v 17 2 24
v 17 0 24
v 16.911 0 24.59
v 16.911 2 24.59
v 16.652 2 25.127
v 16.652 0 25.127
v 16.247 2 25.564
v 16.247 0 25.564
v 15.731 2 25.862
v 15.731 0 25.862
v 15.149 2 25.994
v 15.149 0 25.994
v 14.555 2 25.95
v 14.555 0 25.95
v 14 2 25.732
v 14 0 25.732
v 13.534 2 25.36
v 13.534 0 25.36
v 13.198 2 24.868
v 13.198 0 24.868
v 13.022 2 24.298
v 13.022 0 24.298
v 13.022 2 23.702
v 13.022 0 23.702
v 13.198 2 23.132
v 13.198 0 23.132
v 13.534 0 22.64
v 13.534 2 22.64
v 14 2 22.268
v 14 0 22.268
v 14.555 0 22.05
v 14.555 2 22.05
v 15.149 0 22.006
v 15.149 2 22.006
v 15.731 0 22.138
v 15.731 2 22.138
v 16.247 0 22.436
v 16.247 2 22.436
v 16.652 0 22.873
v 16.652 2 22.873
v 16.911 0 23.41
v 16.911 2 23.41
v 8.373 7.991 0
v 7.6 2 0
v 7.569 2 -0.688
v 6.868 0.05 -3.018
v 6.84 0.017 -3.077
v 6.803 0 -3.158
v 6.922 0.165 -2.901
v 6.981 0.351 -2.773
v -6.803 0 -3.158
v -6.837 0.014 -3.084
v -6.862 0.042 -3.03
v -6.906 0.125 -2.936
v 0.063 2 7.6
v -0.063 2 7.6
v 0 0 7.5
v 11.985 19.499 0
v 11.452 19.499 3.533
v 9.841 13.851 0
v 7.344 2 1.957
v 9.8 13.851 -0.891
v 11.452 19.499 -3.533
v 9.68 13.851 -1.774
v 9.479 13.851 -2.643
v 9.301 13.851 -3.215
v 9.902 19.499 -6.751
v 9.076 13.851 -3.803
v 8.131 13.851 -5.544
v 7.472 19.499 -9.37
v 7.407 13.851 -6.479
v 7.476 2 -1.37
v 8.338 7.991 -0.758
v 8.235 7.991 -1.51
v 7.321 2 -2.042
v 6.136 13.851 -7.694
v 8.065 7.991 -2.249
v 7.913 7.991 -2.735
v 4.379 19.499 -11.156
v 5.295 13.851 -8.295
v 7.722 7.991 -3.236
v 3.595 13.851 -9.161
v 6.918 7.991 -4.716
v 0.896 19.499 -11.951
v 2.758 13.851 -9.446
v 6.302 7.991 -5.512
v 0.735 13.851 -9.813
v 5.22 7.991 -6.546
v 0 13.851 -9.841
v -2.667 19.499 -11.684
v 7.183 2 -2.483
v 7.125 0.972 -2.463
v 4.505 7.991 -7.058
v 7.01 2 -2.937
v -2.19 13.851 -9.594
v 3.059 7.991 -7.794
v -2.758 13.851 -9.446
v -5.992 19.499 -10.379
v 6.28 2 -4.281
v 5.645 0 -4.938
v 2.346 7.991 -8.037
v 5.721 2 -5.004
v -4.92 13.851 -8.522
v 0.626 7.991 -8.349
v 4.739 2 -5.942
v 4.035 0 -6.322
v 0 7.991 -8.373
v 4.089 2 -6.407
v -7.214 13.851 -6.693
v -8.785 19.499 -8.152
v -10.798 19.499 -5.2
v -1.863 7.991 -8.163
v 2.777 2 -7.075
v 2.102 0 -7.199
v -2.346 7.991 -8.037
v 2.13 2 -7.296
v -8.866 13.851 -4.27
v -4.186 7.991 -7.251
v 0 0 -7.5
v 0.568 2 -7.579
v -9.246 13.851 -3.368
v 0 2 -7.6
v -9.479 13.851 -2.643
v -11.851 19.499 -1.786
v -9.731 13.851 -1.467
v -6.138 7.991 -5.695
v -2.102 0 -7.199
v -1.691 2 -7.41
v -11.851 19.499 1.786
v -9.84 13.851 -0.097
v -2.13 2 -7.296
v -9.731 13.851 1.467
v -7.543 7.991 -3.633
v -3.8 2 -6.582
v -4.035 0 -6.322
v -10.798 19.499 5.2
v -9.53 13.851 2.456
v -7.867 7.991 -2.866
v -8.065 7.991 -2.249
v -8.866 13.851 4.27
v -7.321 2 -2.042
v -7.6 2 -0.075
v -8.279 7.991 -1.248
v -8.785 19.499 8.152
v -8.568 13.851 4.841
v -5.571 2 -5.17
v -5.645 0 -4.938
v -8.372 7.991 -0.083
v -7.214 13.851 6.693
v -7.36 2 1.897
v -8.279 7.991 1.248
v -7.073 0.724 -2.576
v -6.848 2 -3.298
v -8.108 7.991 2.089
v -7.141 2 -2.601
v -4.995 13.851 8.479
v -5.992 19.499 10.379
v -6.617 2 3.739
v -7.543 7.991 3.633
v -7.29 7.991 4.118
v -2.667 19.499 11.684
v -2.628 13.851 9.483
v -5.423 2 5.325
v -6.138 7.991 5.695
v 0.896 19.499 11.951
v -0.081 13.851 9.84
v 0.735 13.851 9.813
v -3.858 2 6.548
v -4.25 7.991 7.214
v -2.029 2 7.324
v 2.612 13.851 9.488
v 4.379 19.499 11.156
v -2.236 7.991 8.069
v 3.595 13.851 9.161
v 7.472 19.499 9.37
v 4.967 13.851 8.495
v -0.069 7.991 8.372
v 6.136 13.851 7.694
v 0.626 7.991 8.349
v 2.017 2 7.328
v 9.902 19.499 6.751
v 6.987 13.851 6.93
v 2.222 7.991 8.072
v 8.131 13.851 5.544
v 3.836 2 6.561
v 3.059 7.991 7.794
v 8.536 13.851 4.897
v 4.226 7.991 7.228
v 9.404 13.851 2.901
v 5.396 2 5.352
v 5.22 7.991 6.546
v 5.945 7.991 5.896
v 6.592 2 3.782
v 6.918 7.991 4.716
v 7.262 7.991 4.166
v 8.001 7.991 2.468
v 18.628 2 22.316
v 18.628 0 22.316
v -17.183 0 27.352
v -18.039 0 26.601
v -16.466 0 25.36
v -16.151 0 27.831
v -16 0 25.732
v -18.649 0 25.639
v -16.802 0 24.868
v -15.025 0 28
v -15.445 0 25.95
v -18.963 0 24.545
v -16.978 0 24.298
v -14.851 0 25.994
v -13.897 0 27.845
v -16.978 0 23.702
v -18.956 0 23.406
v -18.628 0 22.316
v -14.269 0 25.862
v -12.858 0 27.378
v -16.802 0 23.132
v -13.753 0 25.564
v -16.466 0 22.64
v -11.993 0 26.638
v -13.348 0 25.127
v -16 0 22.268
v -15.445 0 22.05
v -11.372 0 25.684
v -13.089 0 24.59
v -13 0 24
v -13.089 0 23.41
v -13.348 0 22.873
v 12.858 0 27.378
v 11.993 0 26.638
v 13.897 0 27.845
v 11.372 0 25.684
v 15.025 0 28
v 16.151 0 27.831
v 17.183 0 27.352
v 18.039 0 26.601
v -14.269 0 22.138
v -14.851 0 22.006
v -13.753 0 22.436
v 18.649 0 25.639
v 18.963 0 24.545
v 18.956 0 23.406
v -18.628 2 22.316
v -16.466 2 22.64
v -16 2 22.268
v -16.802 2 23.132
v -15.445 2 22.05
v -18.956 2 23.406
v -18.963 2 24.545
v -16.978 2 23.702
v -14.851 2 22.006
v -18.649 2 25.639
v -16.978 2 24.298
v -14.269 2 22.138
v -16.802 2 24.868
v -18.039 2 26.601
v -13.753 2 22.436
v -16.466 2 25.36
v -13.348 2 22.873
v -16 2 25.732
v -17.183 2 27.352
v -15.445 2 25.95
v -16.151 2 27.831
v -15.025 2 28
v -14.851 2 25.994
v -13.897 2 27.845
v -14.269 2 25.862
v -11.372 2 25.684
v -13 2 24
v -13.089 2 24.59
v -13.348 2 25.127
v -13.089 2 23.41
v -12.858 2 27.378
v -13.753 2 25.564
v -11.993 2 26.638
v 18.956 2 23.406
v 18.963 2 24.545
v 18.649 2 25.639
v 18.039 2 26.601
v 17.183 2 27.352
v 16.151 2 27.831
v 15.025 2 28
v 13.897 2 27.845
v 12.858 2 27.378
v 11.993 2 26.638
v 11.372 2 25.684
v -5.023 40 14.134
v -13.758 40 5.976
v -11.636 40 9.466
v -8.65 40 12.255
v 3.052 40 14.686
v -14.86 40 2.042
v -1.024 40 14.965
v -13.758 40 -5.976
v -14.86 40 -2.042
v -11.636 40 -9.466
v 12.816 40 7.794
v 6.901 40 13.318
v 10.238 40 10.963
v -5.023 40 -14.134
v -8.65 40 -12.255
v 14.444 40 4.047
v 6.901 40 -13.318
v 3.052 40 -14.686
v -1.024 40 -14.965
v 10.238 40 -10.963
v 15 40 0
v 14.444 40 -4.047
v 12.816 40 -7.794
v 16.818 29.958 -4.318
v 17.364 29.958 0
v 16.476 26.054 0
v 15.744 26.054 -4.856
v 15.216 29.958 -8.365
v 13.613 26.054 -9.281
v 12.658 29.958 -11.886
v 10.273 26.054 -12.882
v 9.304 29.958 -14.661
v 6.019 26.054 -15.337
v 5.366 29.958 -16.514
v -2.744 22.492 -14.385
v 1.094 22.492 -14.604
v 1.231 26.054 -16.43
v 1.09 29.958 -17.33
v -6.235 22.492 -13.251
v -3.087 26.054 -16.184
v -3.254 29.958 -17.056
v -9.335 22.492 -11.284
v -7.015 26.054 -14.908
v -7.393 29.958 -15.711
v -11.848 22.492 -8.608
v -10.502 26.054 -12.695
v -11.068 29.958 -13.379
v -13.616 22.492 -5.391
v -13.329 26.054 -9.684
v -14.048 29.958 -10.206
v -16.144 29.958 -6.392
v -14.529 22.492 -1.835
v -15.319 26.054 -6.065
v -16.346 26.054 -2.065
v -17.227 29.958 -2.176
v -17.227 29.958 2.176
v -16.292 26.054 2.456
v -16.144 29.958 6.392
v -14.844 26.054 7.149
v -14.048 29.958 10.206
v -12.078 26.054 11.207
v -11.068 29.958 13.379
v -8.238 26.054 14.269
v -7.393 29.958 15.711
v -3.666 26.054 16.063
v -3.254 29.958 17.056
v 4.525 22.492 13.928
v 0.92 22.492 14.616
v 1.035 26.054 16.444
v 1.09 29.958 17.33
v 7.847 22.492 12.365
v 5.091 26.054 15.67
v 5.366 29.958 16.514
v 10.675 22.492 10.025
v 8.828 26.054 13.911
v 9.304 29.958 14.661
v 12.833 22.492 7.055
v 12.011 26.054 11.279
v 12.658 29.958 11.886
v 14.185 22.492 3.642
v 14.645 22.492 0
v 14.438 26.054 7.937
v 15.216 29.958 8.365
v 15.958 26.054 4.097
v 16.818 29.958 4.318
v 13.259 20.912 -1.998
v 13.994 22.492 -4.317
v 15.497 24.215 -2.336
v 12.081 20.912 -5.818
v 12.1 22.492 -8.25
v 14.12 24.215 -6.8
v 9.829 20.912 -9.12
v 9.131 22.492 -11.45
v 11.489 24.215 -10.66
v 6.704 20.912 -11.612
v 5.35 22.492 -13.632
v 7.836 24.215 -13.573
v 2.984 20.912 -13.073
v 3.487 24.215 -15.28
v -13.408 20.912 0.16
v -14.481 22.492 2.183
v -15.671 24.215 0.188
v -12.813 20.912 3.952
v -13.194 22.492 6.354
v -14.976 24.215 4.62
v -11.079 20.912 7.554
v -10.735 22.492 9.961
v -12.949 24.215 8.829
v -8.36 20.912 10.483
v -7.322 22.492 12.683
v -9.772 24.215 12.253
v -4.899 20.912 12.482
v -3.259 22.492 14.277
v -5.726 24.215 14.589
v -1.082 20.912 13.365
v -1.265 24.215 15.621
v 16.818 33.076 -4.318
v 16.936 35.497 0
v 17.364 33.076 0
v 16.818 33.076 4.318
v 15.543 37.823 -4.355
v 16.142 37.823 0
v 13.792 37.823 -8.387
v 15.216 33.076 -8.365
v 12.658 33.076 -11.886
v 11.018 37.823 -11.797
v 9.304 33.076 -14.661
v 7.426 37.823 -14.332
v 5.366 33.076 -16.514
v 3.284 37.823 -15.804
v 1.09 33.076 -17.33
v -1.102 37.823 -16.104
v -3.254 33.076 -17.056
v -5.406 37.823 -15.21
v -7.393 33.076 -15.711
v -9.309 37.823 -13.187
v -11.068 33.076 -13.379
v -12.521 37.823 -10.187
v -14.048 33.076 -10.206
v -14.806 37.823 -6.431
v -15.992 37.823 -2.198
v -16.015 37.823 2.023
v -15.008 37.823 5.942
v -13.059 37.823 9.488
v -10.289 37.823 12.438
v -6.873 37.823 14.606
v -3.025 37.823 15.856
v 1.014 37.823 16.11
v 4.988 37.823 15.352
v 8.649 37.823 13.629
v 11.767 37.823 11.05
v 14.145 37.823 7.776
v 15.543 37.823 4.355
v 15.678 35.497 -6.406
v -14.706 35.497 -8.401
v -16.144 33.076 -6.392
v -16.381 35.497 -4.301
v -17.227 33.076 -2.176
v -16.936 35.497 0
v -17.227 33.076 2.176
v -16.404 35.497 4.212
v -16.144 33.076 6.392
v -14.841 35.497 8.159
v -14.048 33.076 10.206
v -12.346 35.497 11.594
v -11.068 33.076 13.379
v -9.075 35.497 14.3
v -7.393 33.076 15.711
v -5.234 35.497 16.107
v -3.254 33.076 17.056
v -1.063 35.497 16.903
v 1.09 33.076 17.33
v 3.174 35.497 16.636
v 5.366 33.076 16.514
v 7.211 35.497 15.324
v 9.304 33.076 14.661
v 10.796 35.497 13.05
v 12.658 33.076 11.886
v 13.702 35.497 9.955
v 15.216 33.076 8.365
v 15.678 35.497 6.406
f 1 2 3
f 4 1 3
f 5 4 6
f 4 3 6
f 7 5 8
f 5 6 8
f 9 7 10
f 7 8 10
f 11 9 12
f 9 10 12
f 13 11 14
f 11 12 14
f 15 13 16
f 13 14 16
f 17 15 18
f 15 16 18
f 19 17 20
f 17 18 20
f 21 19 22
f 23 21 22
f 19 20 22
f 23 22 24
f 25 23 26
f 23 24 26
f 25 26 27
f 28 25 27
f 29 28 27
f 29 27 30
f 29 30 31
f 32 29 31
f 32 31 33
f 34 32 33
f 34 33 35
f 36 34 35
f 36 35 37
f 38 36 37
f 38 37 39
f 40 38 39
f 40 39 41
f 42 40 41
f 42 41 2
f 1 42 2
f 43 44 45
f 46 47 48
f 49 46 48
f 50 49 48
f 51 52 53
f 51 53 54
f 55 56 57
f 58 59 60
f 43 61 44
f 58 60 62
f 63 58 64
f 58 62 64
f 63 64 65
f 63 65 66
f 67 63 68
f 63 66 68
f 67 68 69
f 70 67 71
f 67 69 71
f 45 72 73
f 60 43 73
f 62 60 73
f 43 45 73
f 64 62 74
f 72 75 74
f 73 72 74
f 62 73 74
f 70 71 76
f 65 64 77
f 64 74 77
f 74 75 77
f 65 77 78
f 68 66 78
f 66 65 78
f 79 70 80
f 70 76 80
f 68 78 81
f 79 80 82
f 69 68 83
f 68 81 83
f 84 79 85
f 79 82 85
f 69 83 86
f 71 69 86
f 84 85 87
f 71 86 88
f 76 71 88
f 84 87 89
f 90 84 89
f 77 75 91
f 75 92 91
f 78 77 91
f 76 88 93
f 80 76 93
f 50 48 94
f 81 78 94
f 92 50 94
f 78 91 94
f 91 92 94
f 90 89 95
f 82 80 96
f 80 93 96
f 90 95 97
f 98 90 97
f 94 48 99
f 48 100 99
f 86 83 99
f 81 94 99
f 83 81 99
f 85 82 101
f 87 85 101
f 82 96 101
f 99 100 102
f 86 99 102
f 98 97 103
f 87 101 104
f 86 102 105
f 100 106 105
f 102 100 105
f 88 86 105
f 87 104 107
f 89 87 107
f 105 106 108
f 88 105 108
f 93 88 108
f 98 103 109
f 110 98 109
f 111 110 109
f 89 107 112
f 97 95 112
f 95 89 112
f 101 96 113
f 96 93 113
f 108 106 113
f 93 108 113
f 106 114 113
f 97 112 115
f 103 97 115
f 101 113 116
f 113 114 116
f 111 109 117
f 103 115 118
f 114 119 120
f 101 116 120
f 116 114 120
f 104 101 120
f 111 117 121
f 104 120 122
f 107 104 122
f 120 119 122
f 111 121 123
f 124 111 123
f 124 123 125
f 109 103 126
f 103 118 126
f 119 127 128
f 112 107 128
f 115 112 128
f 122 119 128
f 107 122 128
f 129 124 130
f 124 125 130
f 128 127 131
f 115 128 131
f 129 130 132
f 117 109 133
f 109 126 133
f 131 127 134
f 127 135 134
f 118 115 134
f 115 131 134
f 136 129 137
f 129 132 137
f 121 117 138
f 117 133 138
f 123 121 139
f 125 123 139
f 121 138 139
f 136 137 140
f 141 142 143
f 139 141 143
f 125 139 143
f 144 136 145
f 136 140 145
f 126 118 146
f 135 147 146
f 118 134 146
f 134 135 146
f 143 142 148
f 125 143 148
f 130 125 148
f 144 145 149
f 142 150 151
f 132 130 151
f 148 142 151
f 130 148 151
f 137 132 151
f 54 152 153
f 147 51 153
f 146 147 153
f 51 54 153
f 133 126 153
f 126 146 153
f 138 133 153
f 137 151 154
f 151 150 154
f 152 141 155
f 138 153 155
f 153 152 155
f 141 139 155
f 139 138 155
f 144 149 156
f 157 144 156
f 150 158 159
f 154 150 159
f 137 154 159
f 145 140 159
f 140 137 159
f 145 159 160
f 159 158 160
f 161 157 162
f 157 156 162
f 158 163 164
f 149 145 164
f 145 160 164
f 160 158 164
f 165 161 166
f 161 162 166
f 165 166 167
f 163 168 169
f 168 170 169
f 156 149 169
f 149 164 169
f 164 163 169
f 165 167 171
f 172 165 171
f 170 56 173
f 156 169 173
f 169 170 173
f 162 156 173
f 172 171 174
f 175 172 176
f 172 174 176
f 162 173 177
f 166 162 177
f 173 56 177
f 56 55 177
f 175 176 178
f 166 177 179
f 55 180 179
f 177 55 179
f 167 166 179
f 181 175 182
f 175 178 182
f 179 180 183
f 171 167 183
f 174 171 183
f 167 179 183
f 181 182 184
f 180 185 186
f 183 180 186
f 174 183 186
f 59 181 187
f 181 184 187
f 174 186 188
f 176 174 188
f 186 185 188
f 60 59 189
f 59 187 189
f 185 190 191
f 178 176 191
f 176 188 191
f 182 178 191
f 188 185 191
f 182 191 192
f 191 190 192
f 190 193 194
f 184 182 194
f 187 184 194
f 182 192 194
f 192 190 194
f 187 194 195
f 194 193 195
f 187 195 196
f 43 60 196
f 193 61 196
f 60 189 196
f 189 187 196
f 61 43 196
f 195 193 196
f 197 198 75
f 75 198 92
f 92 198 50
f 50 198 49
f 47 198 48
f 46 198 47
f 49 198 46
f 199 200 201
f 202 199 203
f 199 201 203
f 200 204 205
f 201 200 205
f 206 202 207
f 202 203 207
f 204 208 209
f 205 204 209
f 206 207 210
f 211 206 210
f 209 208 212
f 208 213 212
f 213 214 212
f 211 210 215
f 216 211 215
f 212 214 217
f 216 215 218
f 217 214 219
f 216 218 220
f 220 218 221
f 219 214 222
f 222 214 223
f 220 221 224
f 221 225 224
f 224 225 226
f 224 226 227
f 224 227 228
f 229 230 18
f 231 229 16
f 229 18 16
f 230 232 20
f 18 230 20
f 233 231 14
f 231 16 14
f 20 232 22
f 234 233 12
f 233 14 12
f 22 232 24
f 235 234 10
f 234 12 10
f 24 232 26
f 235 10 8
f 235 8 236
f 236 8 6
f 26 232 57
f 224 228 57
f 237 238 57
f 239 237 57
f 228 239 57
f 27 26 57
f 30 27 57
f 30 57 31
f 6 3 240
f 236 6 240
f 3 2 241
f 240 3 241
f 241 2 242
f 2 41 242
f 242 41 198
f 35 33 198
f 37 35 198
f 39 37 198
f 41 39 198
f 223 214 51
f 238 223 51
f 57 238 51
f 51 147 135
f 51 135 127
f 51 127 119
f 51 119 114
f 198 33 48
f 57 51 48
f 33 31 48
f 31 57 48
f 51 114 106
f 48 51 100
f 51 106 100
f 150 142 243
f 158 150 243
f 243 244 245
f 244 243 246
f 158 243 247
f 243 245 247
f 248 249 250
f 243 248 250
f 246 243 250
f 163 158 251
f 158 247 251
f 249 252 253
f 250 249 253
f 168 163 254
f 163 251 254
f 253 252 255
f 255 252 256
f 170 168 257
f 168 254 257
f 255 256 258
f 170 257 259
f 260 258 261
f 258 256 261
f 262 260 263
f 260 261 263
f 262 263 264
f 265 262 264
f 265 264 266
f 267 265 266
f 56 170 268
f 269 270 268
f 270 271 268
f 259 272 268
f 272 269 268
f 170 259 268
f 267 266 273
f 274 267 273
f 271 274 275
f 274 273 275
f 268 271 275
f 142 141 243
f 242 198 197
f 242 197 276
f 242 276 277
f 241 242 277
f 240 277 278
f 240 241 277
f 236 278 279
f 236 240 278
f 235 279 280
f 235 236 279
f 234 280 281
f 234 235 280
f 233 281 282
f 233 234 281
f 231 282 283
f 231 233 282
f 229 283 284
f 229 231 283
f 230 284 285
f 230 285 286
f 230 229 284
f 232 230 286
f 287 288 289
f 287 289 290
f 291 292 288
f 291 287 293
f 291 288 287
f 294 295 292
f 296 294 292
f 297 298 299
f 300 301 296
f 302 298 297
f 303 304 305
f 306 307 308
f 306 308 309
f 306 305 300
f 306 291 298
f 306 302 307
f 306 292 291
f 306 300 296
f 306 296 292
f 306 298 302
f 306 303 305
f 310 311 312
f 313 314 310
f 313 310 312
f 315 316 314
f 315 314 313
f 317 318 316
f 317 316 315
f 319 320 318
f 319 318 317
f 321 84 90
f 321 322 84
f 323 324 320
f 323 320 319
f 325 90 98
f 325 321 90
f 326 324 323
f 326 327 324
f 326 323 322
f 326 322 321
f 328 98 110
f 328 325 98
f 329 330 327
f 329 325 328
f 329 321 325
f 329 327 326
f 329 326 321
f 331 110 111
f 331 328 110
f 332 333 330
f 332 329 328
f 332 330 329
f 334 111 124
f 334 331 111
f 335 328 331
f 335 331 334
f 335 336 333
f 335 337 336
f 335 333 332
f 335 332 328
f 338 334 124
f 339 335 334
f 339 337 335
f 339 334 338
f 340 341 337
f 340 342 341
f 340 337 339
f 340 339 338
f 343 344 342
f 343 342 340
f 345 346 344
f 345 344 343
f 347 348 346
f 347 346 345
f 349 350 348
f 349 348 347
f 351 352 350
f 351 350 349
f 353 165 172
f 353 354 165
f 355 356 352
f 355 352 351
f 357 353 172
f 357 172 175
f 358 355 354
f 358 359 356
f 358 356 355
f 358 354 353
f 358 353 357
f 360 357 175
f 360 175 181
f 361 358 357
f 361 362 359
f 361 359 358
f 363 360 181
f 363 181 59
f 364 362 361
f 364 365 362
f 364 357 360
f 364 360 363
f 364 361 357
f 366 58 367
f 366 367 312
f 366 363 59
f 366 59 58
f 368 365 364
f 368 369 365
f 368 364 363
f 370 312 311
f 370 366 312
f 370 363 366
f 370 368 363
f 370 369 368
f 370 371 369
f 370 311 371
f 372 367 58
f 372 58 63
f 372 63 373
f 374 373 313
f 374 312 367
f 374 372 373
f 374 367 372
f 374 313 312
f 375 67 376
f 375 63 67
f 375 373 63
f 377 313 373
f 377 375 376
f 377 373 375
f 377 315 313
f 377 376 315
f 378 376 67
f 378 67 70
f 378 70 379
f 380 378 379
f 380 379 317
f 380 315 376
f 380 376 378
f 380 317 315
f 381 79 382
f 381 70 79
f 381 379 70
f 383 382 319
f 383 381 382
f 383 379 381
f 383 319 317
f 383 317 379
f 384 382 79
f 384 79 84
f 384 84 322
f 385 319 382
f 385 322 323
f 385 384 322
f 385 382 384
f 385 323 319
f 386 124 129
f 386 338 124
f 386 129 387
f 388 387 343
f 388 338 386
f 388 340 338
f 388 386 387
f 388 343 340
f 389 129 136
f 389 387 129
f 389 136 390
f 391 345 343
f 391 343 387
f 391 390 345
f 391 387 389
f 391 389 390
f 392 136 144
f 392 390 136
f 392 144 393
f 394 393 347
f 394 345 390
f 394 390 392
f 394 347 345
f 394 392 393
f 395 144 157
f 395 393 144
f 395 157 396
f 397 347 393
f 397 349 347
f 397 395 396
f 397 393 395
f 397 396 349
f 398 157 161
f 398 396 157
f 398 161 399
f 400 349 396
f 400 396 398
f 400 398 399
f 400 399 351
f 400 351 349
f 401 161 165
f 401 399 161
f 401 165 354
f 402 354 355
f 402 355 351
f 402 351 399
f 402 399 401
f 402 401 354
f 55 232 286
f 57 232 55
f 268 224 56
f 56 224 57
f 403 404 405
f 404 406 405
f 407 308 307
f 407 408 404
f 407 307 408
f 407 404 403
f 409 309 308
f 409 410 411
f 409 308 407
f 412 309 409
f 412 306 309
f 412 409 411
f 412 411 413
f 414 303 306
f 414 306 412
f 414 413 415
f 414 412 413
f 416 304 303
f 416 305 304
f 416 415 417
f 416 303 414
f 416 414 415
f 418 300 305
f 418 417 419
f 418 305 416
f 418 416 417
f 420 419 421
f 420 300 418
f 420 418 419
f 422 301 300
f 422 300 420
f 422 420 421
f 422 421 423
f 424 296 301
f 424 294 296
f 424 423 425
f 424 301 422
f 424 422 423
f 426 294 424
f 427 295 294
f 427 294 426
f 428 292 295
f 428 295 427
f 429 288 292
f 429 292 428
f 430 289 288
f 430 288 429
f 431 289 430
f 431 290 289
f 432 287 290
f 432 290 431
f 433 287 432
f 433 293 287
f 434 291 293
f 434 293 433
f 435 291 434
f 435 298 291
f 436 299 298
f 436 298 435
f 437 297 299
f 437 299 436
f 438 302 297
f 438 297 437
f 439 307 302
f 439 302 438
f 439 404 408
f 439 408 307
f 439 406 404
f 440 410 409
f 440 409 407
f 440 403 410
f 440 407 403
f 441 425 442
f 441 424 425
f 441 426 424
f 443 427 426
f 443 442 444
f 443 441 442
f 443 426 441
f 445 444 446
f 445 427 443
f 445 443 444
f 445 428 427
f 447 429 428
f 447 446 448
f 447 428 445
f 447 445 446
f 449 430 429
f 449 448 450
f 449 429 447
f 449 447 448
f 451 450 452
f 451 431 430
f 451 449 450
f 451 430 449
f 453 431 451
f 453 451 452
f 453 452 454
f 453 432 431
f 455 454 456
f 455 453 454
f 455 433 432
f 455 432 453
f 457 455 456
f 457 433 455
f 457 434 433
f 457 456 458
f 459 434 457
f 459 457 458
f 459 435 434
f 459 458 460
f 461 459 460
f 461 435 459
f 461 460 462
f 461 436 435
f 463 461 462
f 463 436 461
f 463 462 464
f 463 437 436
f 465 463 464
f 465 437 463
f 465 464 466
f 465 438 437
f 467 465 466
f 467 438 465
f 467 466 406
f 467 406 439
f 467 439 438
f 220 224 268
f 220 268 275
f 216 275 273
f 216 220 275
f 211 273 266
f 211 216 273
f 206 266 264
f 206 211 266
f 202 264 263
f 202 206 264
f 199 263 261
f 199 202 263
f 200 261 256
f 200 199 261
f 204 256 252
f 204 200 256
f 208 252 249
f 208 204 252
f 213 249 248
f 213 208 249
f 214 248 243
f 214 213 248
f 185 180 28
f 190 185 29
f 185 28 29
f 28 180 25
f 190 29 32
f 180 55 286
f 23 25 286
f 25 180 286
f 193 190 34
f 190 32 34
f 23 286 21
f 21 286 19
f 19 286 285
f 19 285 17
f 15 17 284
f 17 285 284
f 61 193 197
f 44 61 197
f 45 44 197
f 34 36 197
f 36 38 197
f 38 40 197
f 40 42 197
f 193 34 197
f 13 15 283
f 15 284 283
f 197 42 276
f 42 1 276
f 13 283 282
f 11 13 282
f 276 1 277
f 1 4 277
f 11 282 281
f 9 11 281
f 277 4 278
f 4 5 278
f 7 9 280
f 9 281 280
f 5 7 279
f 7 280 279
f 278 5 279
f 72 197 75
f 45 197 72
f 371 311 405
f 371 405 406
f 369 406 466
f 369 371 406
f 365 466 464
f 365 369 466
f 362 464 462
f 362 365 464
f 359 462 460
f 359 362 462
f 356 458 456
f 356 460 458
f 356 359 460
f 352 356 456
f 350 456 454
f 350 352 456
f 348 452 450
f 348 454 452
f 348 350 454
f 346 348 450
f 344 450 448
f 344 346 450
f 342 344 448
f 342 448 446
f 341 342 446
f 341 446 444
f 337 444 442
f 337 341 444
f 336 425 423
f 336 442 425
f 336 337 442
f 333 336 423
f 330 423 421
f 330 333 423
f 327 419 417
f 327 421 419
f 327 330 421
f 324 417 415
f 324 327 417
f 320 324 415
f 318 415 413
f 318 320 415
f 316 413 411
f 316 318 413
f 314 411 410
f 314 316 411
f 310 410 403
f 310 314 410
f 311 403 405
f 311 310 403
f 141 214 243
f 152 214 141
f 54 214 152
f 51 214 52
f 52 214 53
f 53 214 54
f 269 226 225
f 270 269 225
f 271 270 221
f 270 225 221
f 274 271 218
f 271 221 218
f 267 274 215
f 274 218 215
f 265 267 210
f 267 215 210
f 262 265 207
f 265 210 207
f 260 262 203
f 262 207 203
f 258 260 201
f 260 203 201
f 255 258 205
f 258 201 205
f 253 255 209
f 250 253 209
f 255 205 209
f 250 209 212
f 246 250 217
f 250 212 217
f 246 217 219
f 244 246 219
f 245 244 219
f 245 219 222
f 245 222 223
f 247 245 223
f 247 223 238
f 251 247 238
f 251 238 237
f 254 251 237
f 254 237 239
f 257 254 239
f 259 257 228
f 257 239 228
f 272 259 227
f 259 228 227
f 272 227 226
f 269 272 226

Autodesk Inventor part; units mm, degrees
ref_plane "YZ Plane" through (0, 0, 0) normal (1, 0, 0) x (0, 1, 0)
ref_plane "XZ Plane" through (0, 0, 0) normal (0, 1, 0) x (-1, 0, 0)
ref_plane "XY Plane" through (0, 0, 0) normal (0, 0, 1) x (1, 0, 0)
sketch "Sketch1" plane through (0, 0, 0) normal (0, 0, 1) x (1, 0, 0)
  line L0 (0, 0) -> (0, 40)
  line L1 (0, 40) -> (15, 40)
  line L2 (0, 40) -> (15, 40) construction
  line L3 (17.3638, 33.076) -> (17.3638, 29.9583)
  arc A0 (11.9847, 19.4992) -> (7.5, 0) centre (59.0045, -1.5803) ccw
  arc A1 (11.9847, 19.4992) -> (15, 40) centre (1.4748, 31.5172) ccw
  line L4 (7.5, 0) -> (0, 0)
  dimension "d0" = 40
  dimension "d2" = 15
  dimension "d3" = 0
  dimension "d5" = 90
  dimension "d6" = 7.5
  dimension "d8" = 15.9652
  dimension "d10" = 17.3638
  dimension "d11" = 6.924
  dimension "d12" = 2.3638
  dimension "d13" = 5.3791
  dimension "d14" = 51.5287
revolve "Revolution1" add sketch "Sketch1" angle 360 about axis through (0, 0, 0) along (0, 1, 0) contours L0 L1 A1 L3 A0 L4
sketch "Sketch2" plane through (0, 0, 0) normal (0, -1, 0) x (1, 0, 0)
  point P0 (0, 0)
sketch "Sketch3" plane through (0, 0, 0) normal (0, -1, 0) x (1, 0, 0)
  line L0 (0, 0) -> (-15, 0) construction
  line L1 (-15, 0) -> (-15, 24) construction
  circle A0 centre (-15, 24) radius 2
  circle A1 centre (15, 24) radius 2
  circle A2 centre (15, 24) radius 4
  circle A3 centre (-15, 24) radius 4
  arc A4 (-7.5, 0) -> (6.8027, -3.158) centre (0, 0) ccw
  circle A5 centre (0, 0) radius 7.5 projected
  line L2 (18.6281, 22.3158) -> (6.8027, -3.158)
  line L3 (-18.6281, 22.3158) -> (-6.8027, -3.158)
  line L4 (11.3719, 25.6842) -> (0, 7.5)
  line L5 (-11.3719, 25.6842) -> (0, 7.5)
  dimension "d15" = 15
  dimension "d16" = 24
  dimension "d17" = 4
  dimension "d18" = 4
  dimension "d19" = 30
  dimension "d20" = 24
  dimension "d21" = 2
  dimension "d22" = 2
  dimension "d23" = 7.119
  dimension "d24" = 56.922
  dimension "d25" = 3.9767
extrude "Extrusion1" add sketch "Sketch3" against normal blind 2 contours A2 | A2 L2 A5 L4 | A5 A4 L3 A3 L5 | A3
properties part number "25 deurknop"
